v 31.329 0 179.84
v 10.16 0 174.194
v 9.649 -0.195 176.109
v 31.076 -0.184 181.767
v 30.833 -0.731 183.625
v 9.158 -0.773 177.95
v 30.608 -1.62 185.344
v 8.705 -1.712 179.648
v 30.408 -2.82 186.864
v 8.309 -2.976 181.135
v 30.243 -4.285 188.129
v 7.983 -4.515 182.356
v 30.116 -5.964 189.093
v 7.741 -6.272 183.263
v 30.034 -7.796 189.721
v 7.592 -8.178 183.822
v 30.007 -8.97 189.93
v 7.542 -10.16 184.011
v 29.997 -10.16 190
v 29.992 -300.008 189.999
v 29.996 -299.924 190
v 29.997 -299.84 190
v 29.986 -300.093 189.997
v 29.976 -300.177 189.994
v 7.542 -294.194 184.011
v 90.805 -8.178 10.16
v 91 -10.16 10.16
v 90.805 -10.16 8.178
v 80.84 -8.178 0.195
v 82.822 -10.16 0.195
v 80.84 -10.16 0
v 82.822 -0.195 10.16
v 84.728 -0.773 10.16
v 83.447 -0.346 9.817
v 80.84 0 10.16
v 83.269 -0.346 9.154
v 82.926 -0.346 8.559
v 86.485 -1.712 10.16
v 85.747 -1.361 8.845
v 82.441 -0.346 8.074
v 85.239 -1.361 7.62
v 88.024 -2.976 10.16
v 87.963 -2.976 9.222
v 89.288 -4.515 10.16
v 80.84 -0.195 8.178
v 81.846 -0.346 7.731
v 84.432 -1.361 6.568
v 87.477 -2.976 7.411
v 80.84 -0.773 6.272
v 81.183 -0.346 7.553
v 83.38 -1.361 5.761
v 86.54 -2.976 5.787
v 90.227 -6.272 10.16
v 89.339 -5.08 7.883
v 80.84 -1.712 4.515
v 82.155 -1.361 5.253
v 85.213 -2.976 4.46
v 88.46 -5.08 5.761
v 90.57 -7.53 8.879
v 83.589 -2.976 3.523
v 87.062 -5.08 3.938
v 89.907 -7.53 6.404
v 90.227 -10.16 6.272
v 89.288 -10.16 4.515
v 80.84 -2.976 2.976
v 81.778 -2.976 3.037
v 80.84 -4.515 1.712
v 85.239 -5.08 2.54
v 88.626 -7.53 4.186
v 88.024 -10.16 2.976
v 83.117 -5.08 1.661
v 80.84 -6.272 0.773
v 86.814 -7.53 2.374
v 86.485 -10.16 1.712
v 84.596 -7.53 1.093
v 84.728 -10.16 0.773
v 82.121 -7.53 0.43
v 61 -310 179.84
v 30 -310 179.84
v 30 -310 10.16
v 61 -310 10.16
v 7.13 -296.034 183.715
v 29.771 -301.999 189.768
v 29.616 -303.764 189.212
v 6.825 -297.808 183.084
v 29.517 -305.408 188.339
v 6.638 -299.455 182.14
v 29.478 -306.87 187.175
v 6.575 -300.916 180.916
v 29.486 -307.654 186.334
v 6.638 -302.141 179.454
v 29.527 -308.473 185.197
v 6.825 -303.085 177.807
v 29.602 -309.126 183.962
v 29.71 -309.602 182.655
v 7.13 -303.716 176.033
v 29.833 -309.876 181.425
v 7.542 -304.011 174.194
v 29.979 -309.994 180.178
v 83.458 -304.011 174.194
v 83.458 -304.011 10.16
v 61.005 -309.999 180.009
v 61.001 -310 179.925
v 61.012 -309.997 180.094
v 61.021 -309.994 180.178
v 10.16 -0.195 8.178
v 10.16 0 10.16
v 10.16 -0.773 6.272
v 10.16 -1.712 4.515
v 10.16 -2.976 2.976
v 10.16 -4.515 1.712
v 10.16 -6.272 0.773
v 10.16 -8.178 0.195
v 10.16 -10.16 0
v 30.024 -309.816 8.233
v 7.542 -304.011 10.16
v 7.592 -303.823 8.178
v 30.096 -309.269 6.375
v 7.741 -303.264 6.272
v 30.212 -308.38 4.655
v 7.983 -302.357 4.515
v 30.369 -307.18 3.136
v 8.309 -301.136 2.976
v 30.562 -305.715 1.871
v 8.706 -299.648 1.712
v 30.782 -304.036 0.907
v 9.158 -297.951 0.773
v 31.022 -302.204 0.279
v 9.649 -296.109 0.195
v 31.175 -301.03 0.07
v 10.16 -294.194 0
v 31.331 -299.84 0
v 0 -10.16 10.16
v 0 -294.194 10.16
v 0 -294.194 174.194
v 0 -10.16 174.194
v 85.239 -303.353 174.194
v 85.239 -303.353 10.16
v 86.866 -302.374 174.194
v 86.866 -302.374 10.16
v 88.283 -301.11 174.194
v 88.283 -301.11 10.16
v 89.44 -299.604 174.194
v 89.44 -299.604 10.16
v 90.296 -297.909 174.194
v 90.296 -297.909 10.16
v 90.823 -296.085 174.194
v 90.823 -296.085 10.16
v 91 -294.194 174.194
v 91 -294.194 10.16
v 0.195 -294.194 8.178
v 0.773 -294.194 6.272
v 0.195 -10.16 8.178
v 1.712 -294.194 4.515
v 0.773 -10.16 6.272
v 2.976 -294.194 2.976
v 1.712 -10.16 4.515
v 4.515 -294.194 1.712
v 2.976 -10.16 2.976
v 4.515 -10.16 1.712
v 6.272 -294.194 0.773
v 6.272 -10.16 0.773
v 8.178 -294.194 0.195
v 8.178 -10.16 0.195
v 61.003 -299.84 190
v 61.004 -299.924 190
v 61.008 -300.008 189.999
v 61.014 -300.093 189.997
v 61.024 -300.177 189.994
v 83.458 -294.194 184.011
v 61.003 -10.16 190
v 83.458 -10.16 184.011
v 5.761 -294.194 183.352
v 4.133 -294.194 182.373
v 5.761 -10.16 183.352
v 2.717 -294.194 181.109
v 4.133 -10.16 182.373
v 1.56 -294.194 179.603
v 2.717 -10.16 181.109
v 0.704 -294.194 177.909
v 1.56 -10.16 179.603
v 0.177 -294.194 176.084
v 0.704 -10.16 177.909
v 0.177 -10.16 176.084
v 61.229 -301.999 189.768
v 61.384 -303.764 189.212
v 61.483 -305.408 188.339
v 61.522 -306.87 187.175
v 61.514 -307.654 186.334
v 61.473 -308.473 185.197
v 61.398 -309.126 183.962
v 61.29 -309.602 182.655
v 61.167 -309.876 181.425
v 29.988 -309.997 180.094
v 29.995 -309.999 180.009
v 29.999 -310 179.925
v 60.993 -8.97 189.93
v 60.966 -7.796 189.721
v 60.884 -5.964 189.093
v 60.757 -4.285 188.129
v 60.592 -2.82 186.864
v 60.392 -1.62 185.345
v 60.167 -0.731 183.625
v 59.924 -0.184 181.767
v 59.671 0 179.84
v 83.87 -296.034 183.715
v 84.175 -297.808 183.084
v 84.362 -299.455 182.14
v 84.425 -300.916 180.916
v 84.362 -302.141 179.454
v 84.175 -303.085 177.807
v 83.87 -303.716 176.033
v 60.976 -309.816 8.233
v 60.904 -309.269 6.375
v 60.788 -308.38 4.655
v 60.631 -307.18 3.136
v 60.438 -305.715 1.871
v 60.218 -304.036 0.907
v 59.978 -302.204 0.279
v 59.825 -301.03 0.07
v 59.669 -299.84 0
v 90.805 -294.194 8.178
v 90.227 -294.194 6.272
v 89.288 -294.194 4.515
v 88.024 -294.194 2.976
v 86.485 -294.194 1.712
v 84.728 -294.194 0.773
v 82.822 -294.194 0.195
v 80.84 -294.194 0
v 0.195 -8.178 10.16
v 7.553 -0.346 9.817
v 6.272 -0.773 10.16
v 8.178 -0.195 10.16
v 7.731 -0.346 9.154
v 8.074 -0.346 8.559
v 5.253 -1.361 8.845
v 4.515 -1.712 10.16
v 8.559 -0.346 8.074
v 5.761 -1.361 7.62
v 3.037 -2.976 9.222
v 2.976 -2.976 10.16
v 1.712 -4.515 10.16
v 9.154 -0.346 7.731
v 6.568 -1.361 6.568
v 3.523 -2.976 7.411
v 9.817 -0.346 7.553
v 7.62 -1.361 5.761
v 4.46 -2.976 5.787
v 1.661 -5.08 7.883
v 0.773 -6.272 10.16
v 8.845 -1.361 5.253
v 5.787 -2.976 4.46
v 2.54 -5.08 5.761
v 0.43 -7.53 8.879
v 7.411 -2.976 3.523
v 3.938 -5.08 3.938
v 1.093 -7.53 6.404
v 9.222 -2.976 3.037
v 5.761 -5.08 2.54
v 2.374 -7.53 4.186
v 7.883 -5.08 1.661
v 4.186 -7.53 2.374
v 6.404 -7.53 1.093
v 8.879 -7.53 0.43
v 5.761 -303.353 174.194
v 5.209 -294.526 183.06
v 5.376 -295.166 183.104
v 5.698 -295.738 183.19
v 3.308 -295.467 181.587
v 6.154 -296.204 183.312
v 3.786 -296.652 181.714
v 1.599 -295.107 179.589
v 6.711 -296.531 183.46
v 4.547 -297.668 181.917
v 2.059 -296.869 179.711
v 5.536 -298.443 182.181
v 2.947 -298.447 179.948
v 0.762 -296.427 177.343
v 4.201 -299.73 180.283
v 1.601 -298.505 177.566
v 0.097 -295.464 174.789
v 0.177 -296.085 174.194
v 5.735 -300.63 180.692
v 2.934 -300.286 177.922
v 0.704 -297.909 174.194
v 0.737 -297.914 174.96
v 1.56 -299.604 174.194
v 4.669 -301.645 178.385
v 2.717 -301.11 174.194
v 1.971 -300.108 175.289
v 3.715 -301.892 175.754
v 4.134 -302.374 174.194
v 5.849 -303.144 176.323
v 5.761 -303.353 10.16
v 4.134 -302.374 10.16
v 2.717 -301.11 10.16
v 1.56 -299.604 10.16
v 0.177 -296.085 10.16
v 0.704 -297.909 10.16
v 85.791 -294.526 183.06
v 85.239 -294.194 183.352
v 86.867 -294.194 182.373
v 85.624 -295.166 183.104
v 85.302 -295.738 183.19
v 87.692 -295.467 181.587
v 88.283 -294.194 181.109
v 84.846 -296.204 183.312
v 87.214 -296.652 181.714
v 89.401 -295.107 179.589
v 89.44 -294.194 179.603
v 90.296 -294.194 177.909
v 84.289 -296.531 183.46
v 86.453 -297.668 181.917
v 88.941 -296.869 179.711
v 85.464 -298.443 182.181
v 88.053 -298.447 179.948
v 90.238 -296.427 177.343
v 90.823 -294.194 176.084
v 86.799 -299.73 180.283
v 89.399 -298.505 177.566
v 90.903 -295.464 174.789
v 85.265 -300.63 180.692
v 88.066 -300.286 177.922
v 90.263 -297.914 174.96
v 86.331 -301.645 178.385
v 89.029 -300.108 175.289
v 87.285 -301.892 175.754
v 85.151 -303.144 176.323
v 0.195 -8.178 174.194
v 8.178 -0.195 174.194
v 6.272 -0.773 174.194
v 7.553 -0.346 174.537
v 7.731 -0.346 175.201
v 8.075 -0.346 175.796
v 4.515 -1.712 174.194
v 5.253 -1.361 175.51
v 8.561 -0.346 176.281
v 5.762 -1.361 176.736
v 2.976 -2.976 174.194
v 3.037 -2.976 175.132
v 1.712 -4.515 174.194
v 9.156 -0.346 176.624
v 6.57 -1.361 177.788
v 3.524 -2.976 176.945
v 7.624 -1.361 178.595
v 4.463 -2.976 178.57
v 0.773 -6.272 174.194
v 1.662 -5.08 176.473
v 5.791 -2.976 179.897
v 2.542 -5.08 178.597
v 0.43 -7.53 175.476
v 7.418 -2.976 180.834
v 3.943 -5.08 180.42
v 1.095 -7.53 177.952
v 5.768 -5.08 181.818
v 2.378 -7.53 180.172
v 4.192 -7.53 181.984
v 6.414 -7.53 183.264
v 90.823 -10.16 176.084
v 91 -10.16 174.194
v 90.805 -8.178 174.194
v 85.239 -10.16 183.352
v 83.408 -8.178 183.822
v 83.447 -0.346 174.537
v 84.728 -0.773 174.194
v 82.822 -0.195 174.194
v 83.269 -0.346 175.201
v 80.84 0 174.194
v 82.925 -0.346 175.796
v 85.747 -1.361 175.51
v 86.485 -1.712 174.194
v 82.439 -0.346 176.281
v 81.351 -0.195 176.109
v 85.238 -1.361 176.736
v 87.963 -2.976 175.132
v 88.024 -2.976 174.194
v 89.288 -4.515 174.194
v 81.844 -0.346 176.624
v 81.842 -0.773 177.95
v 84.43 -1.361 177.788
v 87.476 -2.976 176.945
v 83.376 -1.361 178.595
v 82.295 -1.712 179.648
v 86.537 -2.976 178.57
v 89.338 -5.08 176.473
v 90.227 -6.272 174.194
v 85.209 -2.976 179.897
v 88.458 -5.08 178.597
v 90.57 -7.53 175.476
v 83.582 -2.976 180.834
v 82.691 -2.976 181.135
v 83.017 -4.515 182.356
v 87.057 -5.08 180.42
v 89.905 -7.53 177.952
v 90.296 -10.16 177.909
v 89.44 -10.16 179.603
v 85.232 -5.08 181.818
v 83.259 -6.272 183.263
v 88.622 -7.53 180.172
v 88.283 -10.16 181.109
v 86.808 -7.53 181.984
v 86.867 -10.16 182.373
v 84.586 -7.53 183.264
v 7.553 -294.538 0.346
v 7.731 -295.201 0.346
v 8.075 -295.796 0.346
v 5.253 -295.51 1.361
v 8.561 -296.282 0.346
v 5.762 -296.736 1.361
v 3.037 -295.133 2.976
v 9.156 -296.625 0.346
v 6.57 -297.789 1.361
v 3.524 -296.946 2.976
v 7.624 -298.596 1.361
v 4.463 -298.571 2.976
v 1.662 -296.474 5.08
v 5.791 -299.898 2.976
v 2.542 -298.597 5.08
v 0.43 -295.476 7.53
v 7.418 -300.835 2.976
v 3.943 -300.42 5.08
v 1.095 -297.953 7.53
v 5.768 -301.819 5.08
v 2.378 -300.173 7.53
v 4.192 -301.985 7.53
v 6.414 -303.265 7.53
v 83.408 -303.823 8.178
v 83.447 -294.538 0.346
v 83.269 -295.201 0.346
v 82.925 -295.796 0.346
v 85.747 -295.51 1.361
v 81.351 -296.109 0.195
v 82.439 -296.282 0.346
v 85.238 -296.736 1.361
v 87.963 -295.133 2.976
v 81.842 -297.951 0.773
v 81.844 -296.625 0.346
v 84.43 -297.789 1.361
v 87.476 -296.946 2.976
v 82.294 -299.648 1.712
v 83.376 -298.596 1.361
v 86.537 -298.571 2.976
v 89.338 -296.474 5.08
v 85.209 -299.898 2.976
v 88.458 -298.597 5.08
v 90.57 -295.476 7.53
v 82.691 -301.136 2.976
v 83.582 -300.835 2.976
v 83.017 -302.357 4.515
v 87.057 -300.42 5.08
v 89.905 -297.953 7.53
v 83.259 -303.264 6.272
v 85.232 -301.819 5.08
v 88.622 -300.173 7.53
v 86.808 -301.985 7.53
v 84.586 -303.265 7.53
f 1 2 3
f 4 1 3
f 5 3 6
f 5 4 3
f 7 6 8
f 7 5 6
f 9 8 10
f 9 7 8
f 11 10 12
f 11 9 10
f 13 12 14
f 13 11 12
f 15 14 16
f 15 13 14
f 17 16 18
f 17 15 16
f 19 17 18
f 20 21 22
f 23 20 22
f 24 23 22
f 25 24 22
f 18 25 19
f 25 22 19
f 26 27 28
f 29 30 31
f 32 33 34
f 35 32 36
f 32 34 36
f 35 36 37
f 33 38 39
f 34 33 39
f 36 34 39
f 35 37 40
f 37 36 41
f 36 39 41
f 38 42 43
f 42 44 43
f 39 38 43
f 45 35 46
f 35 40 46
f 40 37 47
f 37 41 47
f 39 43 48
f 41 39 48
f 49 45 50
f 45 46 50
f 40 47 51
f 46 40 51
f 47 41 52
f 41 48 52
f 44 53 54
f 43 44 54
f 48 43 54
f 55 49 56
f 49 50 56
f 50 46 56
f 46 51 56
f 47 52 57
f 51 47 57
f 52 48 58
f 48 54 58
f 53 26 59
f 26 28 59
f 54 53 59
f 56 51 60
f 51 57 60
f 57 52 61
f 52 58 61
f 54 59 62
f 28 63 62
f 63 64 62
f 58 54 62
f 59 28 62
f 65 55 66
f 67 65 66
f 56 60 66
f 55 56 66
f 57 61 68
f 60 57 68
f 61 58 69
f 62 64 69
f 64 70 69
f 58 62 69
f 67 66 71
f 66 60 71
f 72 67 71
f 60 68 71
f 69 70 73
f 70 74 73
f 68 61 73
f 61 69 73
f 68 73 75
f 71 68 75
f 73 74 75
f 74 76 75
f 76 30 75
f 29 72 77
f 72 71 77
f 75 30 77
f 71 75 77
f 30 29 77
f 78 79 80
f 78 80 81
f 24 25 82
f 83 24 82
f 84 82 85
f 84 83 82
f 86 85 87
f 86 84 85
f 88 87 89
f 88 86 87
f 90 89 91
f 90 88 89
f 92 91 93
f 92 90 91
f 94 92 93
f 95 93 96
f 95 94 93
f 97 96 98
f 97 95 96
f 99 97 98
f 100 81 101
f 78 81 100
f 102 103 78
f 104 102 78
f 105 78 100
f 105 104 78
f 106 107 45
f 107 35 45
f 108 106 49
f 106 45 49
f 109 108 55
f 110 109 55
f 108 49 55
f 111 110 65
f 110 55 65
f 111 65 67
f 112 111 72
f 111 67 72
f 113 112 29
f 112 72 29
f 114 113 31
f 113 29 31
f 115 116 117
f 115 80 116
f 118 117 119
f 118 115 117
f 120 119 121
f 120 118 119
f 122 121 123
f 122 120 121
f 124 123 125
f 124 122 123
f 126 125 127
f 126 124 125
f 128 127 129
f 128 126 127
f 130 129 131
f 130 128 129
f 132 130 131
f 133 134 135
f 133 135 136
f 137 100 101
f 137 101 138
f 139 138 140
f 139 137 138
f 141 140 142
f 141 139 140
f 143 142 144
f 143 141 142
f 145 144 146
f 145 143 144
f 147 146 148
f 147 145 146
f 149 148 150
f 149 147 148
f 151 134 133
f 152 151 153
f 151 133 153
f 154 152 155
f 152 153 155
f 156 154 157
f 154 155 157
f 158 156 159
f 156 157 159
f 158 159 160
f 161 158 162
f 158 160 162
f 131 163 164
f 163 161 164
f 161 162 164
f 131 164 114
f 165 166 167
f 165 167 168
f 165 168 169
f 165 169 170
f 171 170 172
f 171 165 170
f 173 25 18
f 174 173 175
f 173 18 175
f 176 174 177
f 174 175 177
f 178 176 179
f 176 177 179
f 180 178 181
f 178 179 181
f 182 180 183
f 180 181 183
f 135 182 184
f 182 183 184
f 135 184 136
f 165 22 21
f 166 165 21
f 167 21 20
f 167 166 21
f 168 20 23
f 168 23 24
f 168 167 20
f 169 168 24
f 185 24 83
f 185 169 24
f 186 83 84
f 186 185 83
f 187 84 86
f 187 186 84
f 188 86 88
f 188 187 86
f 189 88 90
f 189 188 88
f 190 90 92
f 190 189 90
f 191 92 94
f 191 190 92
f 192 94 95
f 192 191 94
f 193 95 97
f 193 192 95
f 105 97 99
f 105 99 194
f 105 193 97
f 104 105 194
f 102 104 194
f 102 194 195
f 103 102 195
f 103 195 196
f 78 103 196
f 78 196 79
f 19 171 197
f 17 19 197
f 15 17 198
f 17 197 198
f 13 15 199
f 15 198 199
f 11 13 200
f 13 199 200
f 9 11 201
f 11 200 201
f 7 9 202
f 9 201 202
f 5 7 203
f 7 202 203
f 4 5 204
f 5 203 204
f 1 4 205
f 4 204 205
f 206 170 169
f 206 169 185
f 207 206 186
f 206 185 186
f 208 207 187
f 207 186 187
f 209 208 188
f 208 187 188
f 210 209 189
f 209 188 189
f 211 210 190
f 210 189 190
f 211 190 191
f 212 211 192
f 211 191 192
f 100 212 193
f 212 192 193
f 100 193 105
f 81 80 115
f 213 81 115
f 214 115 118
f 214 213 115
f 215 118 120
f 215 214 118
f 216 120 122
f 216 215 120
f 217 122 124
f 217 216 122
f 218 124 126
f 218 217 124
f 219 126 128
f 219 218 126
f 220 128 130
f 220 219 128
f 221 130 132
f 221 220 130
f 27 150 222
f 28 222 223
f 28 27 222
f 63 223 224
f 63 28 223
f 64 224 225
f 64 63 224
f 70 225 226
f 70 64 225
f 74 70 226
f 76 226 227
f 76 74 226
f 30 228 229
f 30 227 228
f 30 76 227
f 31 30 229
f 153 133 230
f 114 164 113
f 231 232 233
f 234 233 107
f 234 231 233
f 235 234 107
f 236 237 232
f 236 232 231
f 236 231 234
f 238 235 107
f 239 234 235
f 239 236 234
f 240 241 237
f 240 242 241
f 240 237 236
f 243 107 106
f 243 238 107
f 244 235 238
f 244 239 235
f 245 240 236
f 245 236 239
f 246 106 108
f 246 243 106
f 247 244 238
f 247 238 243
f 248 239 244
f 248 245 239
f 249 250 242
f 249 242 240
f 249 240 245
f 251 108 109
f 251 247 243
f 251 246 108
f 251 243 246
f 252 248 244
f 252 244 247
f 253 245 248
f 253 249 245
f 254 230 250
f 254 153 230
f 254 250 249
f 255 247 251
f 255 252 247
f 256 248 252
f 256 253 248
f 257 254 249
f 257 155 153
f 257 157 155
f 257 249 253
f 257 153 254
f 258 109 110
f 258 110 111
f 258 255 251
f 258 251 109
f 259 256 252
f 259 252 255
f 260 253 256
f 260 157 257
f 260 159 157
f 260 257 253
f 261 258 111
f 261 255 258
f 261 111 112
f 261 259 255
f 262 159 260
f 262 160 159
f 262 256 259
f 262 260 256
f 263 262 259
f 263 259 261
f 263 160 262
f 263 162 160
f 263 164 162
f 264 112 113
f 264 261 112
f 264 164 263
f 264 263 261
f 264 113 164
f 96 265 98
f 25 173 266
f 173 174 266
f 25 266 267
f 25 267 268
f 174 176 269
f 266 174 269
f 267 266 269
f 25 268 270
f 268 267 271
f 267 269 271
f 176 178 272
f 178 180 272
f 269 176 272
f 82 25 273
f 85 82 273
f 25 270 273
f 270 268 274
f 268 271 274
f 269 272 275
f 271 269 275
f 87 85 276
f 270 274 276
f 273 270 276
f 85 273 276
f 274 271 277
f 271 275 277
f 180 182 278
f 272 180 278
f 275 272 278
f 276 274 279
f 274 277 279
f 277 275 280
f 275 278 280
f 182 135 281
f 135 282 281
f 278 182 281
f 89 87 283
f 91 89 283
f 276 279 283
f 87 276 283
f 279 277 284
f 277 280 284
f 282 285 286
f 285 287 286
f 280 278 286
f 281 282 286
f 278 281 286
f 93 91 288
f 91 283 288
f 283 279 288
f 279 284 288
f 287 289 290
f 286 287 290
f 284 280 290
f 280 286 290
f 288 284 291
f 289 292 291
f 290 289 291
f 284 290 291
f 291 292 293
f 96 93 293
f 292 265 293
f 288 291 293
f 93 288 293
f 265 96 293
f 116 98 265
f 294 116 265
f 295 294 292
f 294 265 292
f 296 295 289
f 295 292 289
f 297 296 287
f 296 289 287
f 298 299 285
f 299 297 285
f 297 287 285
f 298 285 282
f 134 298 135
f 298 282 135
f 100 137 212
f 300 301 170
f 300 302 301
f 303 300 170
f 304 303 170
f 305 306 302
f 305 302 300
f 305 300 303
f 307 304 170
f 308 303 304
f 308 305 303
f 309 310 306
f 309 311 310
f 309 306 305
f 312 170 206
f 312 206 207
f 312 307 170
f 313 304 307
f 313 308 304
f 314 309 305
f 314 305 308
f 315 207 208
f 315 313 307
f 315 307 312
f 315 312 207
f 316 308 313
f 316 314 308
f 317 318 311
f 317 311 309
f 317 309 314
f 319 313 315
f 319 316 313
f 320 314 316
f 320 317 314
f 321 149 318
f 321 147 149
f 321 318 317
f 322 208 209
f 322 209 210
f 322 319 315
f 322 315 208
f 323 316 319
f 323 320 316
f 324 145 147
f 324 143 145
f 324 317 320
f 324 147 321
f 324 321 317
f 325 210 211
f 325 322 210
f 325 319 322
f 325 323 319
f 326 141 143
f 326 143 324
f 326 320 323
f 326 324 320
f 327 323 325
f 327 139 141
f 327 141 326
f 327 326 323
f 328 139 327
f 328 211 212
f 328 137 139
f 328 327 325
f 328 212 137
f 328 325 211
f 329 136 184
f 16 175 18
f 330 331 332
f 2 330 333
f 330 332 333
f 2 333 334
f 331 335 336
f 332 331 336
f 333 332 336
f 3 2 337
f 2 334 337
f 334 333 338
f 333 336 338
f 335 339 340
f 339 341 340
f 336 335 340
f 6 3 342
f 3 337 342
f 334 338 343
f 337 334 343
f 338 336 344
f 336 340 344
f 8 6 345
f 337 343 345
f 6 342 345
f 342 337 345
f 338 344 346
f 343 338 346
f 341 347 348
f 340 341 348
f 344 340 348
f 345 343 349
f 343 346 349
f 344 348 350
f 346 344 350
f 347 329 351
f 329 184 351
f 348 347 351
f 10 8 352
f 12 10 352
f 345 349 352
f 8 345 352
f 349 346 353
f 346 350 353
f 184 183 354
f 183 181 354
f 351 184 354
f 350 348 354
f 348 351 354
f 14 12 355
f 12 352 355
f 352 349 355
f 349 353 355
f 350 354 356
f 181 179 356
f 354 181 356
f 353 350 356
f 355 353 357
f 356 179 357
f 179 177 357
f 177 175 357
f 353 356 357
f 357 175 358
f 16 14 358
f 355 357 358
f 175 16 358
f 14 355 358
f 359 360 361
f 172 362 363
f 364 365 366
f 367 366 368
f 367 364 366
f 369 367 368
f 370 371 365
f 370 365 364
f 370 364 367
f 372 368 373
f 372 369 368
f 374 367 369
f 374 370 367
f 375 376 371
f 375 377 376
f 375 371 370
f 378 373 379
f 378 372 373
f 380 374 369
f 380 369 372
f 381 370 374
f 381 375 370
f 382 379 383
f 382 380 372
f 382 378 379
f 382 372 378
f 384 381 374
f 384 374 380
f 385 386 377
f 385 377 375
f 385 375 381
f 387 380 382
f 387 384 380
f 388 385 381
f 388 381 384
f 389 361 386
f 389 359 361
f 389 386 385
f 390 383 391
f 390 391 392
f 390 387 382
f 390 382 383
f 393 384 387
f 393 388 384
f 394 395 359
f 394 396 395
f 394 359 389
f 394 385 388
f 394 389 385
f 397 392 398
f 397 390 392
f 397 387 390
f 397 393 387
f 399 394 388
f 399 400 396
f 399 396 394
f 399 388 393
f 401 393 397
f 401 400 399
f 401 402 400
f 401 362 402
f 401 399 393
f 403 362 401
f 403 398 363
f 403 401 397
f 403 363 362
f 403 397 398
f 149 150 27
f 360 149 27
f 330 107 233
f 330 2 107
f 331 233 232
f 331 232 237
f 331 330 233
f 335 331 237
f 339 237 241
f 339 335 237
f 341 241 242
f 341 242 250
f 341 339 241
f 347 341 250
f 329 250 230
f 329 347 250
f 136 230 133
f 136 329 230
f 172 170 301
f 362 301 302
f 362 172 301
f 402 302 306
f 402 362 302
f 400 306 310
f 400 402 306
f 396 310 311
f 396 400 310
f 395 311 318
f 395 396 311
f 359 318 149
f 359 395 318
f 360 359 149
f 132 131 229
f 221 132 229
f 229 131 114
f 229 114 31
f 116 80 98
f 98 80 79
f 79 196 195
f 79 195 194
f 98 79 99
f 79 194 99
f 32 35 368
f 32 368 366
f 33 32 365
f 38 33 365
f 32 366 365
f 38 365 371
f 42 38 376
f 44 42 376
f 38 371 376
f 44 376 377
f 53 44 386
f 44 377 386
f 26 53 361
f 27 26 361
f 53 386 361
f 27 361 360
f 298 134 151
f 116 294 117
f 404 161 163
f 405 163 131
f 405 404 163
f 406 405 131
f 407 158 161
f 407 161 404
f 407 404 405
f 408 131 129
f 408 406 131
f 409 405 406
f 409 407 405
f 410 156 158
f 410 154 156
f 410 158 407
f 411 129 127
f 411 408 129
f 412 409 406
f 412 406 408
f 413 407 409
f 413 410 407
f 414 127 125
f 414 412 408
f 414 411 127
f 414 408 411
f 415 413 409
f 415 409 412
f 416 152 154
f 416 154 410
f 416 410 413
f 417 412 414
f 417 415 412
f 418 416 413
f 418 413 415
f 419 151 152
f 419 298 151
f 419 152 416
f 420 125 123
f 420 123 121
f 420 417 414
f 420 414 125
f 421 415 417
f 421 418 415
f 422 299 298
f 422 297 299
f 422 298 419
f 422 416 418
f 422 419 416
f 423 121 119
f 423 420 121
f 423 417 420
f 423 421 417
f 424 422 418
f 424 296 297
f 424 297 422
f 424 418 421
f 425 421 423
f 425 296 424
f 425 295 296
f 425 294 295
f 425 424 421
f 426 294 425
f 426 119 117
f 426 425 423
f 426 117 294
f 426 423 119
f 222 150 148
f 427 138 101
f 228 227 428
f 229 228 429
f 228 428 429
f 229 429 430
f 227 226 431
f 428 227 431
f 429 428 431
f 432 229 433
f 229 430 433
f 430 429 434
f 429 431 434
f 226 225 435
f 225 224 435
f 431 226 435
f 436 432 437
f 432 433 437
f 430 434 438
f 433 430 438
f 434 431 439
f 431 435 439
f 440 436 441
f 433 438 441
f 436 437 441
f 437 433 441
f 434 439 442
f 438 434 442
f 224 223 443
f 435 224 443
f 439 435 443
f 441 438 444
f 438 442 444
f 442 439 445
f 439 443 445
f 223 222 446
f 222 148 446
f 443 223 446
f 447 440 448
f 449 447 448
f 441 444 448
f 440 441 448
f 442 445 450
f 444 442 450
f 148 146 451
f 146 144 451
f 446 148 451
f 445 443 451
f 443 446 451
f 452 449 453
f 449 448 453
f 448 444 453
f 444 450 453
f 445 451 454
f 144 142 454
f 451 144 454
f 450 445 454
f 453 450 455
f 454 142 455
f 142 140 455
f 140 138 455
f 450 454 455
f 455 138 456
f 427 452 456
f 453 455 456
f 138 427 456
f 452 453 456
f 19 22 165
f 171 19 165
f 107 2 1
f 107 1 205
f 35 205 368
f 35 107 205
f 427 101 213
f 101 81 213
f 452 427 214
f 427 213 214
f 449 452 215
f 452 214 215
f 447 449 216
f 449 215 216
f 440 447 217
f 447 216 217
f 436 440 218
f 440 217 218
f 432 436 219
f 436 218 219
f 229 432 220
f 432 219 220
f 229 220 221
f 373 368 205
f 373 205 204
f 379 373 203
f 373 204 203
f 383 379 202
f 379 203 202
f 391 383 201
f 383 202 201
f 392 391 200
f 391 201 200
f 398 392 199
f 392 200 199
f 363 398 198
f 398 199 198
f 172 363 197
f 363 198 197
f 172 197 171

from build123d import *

# Parameters (mm, degrees)
F0_W       = 91
F0_H       = 310
F1_DEPTH   = 190
F2_SIZE2   = 30
F2_SIZE    = 8
F2_2_SIZE2 = 30
F2_2_SIZE  = 8
F3_SIZE2   = 29.9974
F3_SIZE    = 8.001
F3_2_SIZE2 = 29.9974
F3_2_SIZE  = 8.001
F4_R       = 10.16


with BuildPart() as f1:
    # F0 (on Top) → F1 (new body)
    with BuildSketch(Plane.XY):
        with Locations((45.5, -155)):
            Rectangle(F0_W, F0_H)
    extrude(amount=F1_DEPTH)

    # F2
    f2_edges = [f1.edges().sort_by_distance(p)[0] for p in [
        (91, -310, 95),
    ]]
    f2_side = f1.faces().sort_by_distance((91, -155, 95))[0]
    chamfer(f2_edges, length=F2_SIZE, length2=F2_SIZE2, reference=f2_side)

    # F2#2
    f2_2_edges = [f1.edges().sort_by_distance(p)[0] for p in [
        (0, -310, 95),
    ]]
    f2_2_side = f1.faces().sort_by_distance((0, -155, 95))[0]
    chamfer(f2_2_edges, length=F2_2_SIZE, length2=F2_2_SIZE2, reference=f2_2_side)

    # F3
    f3_edges = [f1.edges().sort_by_distance(p)[0] for p in [
        (91, -151, 190),
    ]]
    f3_side = f1.faces().sort_by_distance((91, -151, 95))[0]
    chamfer(f3_edges, length=F3_SIZE, length2=F3_SIZE2, reference=f3_side)

    # F3#2
    f3_2_edges = [f1.edges().sort_by_distance(p)[0] for p in [
        (0, -151, 190),
    ]]
    f3_2_side = f1.faces().sort_by_distance((0, -151, 95))[0]
    chamfer(f3_2_edges, length=F3_2_SIZE, length2=F3_2_SIZE2, reference=f3_2_side)

    # F4 (call 1 of 2: OpenCascade refuses the feature's edges together)
    f4_edges = [f1.edges().sort_by_distance(p)[0] for p in [
        (0, -302, 90.9995),
        (0, -151, 181.999),
        (0, -151, 0),
        (0, 0, 90.9995),
        (91, -302, 90.9995),
        (91, -151, 181.999),
        (91, -151, 0),
        (91, 0, 90.9995),
        (45.5, -310, 0),
        (15, -306, 0),
        (76, -306, 0),
        (45.5, 0, 0),
        (76.0013, -305.999653, 185.9995),
        (14.9987, -305.999653, 185.9995),
        (14.9987, 0, 185.9995),
        (76.0013, 0, 185.9995),
        (45.5, 0, 190),
    ]]
    fillet(f4_edges, radius=F4_R)

    # F4#2 (call 2 of 2)
    f4_2_edges = [f1.edges().sort_by_distance(p)[0] for p in [
        (45.5, -310, 190),
    ]]
    fillet(f4_2_edges, radius=F4_R)


solid = f1.part
